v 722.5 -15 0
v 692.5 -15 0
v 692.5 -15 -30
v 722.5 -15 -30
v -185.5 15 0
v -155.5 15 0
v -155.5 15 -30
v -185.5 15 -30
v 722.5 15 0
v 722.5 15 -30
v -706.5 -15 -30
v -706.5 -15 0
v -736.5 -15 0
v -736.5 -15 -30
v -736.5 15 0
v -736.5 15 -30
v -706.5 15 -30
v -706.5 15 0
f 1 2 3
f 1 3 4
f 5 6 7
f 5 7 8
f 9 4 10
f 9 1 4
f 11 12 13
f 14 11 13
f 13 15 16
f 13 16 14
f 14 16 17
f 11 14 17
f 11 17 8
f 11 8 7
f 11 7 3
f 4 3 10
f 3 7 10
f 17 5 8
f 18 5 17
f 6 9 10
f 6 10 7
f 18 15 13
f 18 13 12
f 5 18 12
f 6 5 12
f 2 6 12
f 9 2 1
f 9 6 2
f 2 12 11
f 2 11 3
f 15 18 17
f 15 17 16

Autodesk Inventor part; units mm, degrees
ref_plane "YZ Plane" through (0, 0, 0) normal (1, 0, 0) x (0, 1, 0)
ref_plane "XZ Plane" through (0, 0, 0) normal (0, 1, 0) x (-1, 0, 0)
ref_plane "XY Plane" through (0, 0, 0) normal (0, 0, 1) x (1, 0, 0)
sketch "Boceto1" plane through (0, 0, 0) normal (0, 0, 1) x (1, 0, 0)
  line L0 (-706.5, 15) -> (-706.5, 1360) projected
  line L1 (-706.5, 1360) -> (-185.5, 1360) projected
  line L2 (-185.5, 1360) -> (-185.5, 15) projected
  line L3 (-185.5, 15) -> (-706.5, 15) projected
  line L4 (692.5, -15) -> (692.5, -536) projected
  line L5 (692.5, -536) -> (-706.5, -536) projected
  line L6 (-706.5, -536) -> (-706.5, -15) projected
  line L7 (-706.5, -15) -> (692.5, -15) projected
  line L8 (722.5, -566) -> (722.5, 15) projected
  line L9 (722.5, 15) -> (-155.5, 15) projected
  line L10 (-155.5, 15) -> (-155.5, 1390) projected
  line L11 (-155.5, 1390) -> (-736.5, 1390) projected
  line L12 (-736.5, 1390) -> (-736.5, -566) projected
  line L13 (-736.5, -566) -> (722.5, -566) projected
  line L14 (692.5, -15) -> (722.5, -15)
  line L15 (-706.5, -15) -> (-736.5, -15)
  line L16 (-155.5, 15) -> (-185.5, 15)
  line L17 (-706.5, 15) -> (-736.5, 15)
  point P0 (0, 0)
  dimension "d2" = 1459
  dimension "d3" = 521
  dimension "d4" = 1375
extrude "Extrusión1" add sketch "Boceto1" against normal blind 30 contours L3 L16 L9 L8 L14 L7 L15 L12 L17
properties part number "BarraMarco2.2"
